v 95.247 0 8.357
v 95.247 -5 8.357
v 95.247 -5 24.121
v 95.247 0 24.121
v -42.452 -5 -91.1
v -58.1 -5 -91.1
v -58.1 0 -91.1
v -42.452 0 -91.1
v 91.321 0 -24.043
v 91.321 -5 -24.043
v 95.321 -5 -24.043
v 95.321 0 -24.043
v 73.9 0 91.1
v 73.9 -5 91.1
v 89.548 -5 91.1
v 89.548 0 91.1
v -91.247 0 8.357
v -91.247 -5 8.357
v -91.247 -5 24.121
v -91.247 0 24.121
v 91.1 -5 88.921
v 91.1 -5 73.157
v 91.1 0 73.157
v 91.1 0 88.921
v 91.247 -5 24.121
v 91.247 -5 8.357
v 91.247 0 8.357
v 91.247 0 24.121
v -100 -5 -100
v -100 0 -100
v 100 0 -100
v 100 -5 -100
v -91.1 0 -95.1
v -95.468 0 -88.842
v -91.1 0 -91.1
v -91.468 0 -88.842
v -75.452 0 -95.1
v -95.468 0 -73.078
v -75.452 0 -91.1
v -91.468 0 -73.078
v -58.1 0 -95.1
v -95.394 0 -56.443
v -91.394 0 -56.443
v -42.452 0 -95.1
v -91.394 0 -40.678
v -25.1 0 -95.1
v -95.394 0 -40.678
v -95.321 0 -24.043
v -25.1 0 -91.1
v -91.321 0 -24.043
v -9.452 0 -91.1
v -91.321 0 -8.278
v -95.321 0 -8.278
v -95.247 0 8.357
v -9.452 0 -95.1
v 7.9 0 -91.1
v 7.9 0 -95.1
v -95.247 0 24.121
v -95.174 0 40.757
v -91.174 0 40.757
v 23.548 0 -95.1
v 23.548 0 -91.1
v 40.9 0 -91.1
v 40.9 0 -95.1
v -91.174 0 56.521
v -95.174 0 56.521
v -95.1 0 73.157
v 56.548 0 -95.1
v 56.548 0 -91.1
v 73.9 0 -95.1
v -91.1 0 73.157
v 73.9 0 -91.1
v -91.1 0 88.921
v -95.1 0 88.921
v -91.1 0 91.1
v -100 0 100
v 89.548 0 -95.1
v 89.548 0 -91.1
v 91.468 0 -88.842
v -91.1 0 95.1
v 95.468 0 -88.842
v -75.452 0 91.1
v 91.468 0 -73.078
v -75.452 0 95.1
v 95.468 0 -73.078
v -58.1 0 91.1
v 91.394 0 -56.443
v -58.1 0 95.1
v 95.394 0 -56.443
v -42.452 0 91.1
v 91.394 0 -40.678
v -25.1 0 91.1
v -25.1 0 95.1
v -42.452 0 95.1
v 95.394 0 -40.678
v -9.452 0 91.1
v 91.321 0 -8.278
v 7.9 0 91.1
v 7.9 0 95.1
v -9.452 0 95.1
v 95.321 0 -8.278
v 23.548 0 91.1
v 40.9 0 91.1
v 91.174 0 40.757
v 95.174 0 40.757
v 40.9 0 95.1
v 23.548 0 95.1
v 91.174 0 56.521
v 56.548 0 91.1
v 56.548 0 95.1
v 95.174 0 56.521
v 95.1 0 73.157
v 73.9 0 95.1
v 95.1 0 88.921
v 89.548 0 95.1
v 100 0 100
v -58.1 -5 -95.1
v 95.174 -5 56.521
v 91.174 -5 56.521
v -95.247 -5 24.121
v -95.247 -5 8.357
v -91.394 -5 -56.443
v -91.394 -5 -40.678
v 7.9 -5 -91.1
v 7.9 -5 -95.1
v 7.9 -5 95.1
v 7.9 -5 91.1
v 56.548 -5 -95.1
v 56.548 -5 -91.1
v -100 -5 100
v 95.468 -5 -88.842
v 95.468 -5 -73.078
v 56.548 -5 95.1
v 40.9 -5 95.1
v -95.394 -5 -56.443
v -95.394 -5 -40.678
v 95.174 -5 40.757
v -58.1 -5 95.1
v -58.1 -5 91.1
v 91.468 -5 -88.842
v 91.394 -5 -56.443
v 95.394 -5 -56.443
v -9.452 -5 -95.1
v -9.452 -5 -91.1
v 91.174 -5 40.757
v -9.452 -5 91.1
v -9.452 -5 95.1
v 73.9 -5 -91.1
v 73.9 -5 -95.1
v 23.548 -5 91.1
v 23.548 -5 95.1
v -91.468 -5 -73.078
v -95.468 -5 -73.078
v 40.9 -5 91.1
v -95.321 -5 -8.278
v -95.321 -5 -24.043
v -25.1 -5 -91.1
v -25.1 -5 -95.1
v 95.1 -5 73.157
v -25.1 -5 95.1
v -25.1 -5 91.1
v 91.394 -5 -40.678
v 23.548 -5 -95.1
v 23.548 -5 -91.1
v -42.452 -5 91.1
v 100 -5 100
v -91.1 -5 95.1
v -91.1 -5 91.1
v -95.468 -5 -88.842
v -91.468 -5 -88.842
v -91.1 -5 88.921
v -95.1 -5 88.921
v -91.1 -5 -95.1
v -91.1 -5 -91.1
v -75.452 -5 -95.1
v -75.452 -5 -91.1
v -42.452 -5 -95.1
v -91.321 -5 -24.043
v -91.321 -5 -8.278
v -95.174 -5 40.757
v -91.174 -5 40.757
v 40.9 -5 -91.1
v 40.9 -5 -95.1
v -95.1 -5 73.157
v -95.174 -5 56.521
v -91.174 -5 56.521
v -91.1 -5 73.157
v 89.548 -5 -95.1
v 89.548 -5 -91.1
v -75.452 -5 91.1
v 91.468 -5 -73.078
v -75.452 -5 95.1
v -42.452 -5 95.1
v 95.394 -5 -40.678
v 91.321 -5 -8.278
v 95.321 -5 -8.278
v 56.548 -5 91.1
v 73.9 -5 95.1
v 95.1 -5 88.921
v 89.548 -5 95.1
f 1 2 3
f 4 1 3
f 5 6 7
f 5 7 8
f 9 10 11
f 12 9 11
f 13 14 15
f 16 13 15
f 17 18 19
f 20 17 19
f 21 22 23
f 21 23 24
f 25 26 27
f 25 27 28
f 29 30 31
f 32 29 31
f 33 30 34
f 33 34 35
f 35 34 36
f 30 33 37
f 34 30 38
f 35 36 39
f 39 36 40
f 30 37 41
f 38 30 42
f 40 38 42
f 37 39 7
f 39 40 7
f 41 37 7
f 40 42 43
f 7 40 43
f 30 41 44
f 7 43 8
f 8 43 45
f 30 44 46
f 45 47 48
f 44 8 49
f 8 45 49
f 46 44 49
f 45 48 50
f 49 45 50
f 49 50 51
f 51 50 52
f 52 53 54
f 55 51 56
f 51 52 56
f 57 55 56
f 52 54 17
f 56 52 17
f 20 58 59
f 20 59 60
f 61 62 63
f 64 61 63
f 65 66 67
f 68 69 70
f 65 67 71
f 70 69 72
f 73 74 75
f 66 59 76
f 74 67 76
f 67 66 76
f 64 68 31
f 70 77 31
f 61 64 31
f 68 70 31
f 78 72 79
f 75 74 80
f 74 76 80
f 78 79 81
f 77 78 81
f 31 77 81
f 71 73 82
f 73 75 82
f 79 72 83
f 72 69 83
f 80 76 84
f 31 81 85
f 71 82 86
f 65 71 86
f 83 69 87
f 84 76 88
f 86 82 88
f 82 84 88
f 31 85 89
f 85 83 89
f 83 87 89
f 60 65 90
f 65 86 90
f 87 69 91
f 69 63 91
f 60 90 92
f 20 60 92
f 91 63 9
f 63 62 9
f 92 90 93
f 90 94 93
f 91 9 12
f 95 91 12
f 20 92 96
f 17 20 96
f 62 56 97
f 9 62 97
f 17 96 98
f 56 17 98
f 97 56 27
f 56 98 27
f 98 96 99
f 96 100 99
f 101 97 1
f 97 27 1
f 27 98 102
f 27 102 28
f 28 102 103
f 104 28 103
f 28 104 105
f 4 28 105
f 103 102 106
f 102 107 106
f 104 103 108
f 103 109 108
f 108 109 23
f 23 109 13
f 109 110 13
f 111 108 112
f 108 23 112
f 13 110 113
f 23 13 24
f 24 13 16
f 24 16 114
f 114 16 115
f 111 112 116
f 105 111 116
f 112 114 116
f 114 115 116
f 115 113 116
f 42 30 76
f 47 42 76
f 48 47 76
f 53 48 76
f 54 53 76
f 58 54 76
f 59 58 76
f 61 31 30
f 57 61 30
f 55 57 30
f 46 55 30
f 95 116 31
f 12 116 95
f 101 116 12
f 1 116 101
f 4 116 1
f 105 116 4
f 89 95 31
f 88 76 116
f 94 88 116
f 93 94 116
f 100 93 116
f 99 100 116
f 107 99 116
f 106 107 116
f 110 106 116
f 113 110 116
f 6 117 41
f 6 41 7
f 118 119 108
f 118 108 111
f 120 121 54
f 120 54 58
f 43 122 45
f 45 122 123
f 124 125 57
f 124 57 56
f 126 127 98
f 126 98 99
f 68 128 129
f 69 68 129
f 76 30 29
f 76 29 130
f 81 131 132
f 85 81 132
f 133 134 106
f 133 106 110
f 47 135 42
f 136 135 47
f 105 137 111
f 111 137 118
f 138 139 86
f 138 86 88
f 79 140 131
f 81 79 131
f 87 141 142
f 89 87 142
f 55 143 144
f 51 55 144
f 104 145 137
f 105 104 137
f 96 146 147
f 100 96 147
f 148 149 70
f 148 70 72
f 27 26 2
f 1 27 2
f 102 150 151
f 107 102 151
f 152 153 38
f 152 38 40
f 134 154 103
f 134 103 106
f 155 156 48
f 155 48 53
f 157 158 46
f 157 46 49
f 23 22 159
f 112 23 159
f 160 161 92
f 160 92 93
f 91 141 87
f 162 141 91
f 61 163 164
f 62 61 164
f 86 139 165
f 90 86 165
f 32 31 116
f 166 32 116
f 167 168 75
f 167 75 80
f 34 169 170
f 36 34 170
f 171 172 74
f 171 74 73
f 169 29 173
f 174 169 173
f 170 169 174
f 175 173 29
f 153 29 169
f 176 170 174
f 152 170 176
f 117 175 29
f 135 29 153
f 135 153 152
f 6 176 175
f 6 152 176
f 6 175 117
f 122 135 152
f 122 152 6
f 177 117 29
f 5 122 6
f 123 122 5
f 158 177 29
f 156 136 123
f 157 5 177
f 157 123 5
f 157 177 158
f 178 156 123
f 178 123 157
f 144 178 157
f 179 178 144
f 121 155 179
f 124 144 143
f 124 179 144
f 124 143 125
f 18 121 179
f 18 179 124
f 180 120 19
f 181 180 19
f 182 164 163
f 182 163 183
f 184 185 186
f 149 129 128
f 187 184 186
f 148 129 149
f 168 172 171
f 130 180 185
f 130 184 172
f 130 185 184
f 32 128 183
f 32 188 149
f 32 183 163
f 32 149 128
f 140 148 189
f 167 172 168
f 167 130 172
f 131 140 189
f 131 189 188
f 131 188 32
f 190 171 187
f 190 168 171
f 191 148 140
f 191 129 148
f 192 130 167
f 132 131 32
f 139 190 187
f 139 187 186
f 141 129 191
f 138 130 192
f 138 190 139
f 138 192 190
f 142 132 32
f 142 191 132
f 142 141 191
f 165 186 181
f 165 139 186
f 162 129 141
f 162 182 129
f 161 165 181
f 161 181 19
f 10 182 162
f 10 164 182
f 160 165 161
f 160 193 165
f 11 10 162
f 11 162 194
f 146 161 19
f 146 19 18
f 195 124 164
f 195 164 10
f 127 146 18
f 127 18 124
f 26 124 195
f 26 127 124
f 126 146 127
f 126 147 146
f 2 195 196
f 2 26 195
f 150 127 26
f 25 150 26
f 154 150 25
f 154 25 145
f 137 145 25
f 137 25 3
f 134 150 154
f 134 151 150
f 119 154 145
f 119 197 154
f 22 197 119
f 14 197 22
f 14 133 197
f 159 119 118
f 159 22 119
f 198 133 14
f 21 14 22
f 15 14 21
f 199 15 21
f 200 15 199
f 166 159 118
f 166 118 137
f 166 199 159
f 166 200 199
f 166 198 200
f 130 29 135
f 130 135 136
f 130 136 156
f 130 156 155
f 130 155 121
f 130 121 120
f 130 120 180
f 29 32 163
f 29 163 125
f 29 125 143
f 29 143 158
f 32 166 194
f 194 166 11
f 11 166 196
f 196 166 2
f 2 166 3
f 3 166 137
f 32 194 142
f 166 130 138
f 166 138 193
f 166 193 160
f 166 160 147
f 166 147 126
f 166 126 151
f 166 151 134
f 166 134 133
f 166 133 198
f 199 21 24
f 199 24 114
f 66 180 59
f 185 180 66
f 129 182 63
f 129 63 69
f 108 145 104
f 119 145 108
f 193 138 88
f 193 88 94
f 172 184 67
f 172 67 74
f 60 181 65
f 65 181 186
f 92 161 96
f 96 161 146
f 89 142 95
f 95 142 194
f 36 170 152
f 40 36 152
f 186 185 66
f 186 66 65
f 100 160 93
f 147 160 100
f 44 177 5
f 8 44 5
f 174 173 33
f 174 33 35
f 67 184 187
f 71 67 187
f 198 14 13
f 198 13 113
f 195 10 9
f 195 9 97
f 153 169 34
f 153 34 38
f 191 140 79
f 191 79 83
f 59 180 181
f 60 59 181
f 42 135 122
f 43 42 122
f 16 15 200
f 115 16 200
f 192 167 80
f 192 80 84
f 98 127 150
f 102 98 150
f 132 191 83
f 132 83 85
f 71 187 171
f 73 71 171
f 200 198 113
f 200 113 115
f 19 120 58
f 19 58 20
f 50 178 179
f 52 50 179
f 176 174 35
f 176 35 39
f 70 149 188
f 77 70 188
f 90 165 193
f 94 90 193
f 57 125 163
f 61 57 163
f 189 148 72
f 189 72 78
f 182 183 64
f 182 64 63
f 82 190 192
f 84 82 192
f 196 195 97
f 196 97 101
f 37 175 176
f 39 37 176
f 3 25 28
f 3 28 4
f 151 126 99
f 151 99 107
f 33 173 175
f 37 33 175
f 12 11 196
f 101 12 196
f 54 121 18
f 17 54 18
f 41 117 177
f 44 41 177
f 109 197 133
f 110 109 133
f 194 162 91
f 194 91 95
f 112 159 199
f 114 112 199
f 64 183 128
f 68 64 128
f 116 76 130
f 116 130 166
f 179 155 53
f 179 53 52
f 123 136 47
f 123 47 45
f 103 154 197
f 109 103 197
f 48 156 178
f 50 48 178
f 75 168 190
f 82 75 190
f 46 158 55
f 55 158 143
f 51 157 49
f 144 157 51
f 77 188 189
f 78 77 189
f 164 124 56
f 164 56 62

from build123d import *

# Parameters (mm, degrees)
F0_W     = 200
F0_H     = 200
F1_DEPTH = 5
F2_W     = 15.64841
F2_H     = 4
F2_W_2   = 4
F2_H_2   = 15.764192
F3_DEPTH = 25


with BuildPart() as f1:
    # F0 (on Front) → F1 (new body)
    with BuildSketch(Plane.XZ):
        Rectangle(F0_W, F0_H)
    extrude(amount=F1_DEPTH)

    # F2 (on face) → F3 (cut)
    with BuildSketch(Plane.XZ.offset(5)):
        with Locations((-83.275795, 93.1)):
            Rectangle(F2_W, F2_H)
        with Locations((-50.275795, 93.1)):
            Rectangle(F2_W, F2_H)
        with Locations((-17.275795, 93.1)):
            Rectangle(F2_W, F2_H)
        with Locations((15.724205, 93.1)):
            Rectangle(F2_W, F2_H)
        with Locations((48.724205, 93.1)):
            Rectangle(F2_W, F2_H)
        with Locations((81.724205, 93.1)):
            Rectangle(F2_W, F2_H)
        with Locations((-83.275795, -93.1)):
            Rectangle(F2_W, F2_H)
        with Locations((-50.275795, -93.1)):
            Rectangle(F2_W, F2_H)
        with Locations((-17.275795, -93.1)):
            Rectangle(F2_W, F2_H)
        with Locations((15.724205, -93.1)):
            Rectangle(F2_W, F2_H)
        with Locations((48.724205, -93.1)):
            Rectangle(F2_W, F2_H)
        with Locations((81.724205, -93.1)):
            Rectangle(F2_W, F2_H)
        with Locations((93.1, 81.039183)):
            Rectangle(F2_W_2, F2_H_2)
        with Locations((93.173537, 48.639266)):
            Rectangle(F2_W_2, F2_H_2)
        with Locations((93.247075, 16.23935)):
            Rectangle(F2_W_2, F2_H_2)
        with Locations((93.320613, -16.160567)):
            Rectangle(F2_W_2, F2_H_2)
        with Locations((93.39415, -48.560483)):
            Rectangle(F2_W_2, F2_H_2)
        with Locations((93.467688, -80.9604)):
            Rectangle(F2_W_2, F2_H_2)
        with Locations((-93.1, 81.039183)):
            Rectangle(F2_W_2, F2_H_2)
        with Locations((-93.173537, 48.639266)):
            Rectangle(F2_W_2, F2_H_2)
        with Locations((-93.247075, 16.23935)):
            Rectangle(F2_W_2, F2_H_2)
        with Locations((-93.320613, -16.160567)):
            Rectangle(F2_W_2, F2_H_2)
        with Locations((-93.39415, -48.560483)):
            Rectangle(F2_W_2, F2_H_2)
        with Locations((-93.467688, -80.9604)):
            Rectangle(F2_W_2, F2_H_2)
    extrude(amount=-F3_DEPTH, mode=Mode.SUBTRACT)


solid = f1.part
